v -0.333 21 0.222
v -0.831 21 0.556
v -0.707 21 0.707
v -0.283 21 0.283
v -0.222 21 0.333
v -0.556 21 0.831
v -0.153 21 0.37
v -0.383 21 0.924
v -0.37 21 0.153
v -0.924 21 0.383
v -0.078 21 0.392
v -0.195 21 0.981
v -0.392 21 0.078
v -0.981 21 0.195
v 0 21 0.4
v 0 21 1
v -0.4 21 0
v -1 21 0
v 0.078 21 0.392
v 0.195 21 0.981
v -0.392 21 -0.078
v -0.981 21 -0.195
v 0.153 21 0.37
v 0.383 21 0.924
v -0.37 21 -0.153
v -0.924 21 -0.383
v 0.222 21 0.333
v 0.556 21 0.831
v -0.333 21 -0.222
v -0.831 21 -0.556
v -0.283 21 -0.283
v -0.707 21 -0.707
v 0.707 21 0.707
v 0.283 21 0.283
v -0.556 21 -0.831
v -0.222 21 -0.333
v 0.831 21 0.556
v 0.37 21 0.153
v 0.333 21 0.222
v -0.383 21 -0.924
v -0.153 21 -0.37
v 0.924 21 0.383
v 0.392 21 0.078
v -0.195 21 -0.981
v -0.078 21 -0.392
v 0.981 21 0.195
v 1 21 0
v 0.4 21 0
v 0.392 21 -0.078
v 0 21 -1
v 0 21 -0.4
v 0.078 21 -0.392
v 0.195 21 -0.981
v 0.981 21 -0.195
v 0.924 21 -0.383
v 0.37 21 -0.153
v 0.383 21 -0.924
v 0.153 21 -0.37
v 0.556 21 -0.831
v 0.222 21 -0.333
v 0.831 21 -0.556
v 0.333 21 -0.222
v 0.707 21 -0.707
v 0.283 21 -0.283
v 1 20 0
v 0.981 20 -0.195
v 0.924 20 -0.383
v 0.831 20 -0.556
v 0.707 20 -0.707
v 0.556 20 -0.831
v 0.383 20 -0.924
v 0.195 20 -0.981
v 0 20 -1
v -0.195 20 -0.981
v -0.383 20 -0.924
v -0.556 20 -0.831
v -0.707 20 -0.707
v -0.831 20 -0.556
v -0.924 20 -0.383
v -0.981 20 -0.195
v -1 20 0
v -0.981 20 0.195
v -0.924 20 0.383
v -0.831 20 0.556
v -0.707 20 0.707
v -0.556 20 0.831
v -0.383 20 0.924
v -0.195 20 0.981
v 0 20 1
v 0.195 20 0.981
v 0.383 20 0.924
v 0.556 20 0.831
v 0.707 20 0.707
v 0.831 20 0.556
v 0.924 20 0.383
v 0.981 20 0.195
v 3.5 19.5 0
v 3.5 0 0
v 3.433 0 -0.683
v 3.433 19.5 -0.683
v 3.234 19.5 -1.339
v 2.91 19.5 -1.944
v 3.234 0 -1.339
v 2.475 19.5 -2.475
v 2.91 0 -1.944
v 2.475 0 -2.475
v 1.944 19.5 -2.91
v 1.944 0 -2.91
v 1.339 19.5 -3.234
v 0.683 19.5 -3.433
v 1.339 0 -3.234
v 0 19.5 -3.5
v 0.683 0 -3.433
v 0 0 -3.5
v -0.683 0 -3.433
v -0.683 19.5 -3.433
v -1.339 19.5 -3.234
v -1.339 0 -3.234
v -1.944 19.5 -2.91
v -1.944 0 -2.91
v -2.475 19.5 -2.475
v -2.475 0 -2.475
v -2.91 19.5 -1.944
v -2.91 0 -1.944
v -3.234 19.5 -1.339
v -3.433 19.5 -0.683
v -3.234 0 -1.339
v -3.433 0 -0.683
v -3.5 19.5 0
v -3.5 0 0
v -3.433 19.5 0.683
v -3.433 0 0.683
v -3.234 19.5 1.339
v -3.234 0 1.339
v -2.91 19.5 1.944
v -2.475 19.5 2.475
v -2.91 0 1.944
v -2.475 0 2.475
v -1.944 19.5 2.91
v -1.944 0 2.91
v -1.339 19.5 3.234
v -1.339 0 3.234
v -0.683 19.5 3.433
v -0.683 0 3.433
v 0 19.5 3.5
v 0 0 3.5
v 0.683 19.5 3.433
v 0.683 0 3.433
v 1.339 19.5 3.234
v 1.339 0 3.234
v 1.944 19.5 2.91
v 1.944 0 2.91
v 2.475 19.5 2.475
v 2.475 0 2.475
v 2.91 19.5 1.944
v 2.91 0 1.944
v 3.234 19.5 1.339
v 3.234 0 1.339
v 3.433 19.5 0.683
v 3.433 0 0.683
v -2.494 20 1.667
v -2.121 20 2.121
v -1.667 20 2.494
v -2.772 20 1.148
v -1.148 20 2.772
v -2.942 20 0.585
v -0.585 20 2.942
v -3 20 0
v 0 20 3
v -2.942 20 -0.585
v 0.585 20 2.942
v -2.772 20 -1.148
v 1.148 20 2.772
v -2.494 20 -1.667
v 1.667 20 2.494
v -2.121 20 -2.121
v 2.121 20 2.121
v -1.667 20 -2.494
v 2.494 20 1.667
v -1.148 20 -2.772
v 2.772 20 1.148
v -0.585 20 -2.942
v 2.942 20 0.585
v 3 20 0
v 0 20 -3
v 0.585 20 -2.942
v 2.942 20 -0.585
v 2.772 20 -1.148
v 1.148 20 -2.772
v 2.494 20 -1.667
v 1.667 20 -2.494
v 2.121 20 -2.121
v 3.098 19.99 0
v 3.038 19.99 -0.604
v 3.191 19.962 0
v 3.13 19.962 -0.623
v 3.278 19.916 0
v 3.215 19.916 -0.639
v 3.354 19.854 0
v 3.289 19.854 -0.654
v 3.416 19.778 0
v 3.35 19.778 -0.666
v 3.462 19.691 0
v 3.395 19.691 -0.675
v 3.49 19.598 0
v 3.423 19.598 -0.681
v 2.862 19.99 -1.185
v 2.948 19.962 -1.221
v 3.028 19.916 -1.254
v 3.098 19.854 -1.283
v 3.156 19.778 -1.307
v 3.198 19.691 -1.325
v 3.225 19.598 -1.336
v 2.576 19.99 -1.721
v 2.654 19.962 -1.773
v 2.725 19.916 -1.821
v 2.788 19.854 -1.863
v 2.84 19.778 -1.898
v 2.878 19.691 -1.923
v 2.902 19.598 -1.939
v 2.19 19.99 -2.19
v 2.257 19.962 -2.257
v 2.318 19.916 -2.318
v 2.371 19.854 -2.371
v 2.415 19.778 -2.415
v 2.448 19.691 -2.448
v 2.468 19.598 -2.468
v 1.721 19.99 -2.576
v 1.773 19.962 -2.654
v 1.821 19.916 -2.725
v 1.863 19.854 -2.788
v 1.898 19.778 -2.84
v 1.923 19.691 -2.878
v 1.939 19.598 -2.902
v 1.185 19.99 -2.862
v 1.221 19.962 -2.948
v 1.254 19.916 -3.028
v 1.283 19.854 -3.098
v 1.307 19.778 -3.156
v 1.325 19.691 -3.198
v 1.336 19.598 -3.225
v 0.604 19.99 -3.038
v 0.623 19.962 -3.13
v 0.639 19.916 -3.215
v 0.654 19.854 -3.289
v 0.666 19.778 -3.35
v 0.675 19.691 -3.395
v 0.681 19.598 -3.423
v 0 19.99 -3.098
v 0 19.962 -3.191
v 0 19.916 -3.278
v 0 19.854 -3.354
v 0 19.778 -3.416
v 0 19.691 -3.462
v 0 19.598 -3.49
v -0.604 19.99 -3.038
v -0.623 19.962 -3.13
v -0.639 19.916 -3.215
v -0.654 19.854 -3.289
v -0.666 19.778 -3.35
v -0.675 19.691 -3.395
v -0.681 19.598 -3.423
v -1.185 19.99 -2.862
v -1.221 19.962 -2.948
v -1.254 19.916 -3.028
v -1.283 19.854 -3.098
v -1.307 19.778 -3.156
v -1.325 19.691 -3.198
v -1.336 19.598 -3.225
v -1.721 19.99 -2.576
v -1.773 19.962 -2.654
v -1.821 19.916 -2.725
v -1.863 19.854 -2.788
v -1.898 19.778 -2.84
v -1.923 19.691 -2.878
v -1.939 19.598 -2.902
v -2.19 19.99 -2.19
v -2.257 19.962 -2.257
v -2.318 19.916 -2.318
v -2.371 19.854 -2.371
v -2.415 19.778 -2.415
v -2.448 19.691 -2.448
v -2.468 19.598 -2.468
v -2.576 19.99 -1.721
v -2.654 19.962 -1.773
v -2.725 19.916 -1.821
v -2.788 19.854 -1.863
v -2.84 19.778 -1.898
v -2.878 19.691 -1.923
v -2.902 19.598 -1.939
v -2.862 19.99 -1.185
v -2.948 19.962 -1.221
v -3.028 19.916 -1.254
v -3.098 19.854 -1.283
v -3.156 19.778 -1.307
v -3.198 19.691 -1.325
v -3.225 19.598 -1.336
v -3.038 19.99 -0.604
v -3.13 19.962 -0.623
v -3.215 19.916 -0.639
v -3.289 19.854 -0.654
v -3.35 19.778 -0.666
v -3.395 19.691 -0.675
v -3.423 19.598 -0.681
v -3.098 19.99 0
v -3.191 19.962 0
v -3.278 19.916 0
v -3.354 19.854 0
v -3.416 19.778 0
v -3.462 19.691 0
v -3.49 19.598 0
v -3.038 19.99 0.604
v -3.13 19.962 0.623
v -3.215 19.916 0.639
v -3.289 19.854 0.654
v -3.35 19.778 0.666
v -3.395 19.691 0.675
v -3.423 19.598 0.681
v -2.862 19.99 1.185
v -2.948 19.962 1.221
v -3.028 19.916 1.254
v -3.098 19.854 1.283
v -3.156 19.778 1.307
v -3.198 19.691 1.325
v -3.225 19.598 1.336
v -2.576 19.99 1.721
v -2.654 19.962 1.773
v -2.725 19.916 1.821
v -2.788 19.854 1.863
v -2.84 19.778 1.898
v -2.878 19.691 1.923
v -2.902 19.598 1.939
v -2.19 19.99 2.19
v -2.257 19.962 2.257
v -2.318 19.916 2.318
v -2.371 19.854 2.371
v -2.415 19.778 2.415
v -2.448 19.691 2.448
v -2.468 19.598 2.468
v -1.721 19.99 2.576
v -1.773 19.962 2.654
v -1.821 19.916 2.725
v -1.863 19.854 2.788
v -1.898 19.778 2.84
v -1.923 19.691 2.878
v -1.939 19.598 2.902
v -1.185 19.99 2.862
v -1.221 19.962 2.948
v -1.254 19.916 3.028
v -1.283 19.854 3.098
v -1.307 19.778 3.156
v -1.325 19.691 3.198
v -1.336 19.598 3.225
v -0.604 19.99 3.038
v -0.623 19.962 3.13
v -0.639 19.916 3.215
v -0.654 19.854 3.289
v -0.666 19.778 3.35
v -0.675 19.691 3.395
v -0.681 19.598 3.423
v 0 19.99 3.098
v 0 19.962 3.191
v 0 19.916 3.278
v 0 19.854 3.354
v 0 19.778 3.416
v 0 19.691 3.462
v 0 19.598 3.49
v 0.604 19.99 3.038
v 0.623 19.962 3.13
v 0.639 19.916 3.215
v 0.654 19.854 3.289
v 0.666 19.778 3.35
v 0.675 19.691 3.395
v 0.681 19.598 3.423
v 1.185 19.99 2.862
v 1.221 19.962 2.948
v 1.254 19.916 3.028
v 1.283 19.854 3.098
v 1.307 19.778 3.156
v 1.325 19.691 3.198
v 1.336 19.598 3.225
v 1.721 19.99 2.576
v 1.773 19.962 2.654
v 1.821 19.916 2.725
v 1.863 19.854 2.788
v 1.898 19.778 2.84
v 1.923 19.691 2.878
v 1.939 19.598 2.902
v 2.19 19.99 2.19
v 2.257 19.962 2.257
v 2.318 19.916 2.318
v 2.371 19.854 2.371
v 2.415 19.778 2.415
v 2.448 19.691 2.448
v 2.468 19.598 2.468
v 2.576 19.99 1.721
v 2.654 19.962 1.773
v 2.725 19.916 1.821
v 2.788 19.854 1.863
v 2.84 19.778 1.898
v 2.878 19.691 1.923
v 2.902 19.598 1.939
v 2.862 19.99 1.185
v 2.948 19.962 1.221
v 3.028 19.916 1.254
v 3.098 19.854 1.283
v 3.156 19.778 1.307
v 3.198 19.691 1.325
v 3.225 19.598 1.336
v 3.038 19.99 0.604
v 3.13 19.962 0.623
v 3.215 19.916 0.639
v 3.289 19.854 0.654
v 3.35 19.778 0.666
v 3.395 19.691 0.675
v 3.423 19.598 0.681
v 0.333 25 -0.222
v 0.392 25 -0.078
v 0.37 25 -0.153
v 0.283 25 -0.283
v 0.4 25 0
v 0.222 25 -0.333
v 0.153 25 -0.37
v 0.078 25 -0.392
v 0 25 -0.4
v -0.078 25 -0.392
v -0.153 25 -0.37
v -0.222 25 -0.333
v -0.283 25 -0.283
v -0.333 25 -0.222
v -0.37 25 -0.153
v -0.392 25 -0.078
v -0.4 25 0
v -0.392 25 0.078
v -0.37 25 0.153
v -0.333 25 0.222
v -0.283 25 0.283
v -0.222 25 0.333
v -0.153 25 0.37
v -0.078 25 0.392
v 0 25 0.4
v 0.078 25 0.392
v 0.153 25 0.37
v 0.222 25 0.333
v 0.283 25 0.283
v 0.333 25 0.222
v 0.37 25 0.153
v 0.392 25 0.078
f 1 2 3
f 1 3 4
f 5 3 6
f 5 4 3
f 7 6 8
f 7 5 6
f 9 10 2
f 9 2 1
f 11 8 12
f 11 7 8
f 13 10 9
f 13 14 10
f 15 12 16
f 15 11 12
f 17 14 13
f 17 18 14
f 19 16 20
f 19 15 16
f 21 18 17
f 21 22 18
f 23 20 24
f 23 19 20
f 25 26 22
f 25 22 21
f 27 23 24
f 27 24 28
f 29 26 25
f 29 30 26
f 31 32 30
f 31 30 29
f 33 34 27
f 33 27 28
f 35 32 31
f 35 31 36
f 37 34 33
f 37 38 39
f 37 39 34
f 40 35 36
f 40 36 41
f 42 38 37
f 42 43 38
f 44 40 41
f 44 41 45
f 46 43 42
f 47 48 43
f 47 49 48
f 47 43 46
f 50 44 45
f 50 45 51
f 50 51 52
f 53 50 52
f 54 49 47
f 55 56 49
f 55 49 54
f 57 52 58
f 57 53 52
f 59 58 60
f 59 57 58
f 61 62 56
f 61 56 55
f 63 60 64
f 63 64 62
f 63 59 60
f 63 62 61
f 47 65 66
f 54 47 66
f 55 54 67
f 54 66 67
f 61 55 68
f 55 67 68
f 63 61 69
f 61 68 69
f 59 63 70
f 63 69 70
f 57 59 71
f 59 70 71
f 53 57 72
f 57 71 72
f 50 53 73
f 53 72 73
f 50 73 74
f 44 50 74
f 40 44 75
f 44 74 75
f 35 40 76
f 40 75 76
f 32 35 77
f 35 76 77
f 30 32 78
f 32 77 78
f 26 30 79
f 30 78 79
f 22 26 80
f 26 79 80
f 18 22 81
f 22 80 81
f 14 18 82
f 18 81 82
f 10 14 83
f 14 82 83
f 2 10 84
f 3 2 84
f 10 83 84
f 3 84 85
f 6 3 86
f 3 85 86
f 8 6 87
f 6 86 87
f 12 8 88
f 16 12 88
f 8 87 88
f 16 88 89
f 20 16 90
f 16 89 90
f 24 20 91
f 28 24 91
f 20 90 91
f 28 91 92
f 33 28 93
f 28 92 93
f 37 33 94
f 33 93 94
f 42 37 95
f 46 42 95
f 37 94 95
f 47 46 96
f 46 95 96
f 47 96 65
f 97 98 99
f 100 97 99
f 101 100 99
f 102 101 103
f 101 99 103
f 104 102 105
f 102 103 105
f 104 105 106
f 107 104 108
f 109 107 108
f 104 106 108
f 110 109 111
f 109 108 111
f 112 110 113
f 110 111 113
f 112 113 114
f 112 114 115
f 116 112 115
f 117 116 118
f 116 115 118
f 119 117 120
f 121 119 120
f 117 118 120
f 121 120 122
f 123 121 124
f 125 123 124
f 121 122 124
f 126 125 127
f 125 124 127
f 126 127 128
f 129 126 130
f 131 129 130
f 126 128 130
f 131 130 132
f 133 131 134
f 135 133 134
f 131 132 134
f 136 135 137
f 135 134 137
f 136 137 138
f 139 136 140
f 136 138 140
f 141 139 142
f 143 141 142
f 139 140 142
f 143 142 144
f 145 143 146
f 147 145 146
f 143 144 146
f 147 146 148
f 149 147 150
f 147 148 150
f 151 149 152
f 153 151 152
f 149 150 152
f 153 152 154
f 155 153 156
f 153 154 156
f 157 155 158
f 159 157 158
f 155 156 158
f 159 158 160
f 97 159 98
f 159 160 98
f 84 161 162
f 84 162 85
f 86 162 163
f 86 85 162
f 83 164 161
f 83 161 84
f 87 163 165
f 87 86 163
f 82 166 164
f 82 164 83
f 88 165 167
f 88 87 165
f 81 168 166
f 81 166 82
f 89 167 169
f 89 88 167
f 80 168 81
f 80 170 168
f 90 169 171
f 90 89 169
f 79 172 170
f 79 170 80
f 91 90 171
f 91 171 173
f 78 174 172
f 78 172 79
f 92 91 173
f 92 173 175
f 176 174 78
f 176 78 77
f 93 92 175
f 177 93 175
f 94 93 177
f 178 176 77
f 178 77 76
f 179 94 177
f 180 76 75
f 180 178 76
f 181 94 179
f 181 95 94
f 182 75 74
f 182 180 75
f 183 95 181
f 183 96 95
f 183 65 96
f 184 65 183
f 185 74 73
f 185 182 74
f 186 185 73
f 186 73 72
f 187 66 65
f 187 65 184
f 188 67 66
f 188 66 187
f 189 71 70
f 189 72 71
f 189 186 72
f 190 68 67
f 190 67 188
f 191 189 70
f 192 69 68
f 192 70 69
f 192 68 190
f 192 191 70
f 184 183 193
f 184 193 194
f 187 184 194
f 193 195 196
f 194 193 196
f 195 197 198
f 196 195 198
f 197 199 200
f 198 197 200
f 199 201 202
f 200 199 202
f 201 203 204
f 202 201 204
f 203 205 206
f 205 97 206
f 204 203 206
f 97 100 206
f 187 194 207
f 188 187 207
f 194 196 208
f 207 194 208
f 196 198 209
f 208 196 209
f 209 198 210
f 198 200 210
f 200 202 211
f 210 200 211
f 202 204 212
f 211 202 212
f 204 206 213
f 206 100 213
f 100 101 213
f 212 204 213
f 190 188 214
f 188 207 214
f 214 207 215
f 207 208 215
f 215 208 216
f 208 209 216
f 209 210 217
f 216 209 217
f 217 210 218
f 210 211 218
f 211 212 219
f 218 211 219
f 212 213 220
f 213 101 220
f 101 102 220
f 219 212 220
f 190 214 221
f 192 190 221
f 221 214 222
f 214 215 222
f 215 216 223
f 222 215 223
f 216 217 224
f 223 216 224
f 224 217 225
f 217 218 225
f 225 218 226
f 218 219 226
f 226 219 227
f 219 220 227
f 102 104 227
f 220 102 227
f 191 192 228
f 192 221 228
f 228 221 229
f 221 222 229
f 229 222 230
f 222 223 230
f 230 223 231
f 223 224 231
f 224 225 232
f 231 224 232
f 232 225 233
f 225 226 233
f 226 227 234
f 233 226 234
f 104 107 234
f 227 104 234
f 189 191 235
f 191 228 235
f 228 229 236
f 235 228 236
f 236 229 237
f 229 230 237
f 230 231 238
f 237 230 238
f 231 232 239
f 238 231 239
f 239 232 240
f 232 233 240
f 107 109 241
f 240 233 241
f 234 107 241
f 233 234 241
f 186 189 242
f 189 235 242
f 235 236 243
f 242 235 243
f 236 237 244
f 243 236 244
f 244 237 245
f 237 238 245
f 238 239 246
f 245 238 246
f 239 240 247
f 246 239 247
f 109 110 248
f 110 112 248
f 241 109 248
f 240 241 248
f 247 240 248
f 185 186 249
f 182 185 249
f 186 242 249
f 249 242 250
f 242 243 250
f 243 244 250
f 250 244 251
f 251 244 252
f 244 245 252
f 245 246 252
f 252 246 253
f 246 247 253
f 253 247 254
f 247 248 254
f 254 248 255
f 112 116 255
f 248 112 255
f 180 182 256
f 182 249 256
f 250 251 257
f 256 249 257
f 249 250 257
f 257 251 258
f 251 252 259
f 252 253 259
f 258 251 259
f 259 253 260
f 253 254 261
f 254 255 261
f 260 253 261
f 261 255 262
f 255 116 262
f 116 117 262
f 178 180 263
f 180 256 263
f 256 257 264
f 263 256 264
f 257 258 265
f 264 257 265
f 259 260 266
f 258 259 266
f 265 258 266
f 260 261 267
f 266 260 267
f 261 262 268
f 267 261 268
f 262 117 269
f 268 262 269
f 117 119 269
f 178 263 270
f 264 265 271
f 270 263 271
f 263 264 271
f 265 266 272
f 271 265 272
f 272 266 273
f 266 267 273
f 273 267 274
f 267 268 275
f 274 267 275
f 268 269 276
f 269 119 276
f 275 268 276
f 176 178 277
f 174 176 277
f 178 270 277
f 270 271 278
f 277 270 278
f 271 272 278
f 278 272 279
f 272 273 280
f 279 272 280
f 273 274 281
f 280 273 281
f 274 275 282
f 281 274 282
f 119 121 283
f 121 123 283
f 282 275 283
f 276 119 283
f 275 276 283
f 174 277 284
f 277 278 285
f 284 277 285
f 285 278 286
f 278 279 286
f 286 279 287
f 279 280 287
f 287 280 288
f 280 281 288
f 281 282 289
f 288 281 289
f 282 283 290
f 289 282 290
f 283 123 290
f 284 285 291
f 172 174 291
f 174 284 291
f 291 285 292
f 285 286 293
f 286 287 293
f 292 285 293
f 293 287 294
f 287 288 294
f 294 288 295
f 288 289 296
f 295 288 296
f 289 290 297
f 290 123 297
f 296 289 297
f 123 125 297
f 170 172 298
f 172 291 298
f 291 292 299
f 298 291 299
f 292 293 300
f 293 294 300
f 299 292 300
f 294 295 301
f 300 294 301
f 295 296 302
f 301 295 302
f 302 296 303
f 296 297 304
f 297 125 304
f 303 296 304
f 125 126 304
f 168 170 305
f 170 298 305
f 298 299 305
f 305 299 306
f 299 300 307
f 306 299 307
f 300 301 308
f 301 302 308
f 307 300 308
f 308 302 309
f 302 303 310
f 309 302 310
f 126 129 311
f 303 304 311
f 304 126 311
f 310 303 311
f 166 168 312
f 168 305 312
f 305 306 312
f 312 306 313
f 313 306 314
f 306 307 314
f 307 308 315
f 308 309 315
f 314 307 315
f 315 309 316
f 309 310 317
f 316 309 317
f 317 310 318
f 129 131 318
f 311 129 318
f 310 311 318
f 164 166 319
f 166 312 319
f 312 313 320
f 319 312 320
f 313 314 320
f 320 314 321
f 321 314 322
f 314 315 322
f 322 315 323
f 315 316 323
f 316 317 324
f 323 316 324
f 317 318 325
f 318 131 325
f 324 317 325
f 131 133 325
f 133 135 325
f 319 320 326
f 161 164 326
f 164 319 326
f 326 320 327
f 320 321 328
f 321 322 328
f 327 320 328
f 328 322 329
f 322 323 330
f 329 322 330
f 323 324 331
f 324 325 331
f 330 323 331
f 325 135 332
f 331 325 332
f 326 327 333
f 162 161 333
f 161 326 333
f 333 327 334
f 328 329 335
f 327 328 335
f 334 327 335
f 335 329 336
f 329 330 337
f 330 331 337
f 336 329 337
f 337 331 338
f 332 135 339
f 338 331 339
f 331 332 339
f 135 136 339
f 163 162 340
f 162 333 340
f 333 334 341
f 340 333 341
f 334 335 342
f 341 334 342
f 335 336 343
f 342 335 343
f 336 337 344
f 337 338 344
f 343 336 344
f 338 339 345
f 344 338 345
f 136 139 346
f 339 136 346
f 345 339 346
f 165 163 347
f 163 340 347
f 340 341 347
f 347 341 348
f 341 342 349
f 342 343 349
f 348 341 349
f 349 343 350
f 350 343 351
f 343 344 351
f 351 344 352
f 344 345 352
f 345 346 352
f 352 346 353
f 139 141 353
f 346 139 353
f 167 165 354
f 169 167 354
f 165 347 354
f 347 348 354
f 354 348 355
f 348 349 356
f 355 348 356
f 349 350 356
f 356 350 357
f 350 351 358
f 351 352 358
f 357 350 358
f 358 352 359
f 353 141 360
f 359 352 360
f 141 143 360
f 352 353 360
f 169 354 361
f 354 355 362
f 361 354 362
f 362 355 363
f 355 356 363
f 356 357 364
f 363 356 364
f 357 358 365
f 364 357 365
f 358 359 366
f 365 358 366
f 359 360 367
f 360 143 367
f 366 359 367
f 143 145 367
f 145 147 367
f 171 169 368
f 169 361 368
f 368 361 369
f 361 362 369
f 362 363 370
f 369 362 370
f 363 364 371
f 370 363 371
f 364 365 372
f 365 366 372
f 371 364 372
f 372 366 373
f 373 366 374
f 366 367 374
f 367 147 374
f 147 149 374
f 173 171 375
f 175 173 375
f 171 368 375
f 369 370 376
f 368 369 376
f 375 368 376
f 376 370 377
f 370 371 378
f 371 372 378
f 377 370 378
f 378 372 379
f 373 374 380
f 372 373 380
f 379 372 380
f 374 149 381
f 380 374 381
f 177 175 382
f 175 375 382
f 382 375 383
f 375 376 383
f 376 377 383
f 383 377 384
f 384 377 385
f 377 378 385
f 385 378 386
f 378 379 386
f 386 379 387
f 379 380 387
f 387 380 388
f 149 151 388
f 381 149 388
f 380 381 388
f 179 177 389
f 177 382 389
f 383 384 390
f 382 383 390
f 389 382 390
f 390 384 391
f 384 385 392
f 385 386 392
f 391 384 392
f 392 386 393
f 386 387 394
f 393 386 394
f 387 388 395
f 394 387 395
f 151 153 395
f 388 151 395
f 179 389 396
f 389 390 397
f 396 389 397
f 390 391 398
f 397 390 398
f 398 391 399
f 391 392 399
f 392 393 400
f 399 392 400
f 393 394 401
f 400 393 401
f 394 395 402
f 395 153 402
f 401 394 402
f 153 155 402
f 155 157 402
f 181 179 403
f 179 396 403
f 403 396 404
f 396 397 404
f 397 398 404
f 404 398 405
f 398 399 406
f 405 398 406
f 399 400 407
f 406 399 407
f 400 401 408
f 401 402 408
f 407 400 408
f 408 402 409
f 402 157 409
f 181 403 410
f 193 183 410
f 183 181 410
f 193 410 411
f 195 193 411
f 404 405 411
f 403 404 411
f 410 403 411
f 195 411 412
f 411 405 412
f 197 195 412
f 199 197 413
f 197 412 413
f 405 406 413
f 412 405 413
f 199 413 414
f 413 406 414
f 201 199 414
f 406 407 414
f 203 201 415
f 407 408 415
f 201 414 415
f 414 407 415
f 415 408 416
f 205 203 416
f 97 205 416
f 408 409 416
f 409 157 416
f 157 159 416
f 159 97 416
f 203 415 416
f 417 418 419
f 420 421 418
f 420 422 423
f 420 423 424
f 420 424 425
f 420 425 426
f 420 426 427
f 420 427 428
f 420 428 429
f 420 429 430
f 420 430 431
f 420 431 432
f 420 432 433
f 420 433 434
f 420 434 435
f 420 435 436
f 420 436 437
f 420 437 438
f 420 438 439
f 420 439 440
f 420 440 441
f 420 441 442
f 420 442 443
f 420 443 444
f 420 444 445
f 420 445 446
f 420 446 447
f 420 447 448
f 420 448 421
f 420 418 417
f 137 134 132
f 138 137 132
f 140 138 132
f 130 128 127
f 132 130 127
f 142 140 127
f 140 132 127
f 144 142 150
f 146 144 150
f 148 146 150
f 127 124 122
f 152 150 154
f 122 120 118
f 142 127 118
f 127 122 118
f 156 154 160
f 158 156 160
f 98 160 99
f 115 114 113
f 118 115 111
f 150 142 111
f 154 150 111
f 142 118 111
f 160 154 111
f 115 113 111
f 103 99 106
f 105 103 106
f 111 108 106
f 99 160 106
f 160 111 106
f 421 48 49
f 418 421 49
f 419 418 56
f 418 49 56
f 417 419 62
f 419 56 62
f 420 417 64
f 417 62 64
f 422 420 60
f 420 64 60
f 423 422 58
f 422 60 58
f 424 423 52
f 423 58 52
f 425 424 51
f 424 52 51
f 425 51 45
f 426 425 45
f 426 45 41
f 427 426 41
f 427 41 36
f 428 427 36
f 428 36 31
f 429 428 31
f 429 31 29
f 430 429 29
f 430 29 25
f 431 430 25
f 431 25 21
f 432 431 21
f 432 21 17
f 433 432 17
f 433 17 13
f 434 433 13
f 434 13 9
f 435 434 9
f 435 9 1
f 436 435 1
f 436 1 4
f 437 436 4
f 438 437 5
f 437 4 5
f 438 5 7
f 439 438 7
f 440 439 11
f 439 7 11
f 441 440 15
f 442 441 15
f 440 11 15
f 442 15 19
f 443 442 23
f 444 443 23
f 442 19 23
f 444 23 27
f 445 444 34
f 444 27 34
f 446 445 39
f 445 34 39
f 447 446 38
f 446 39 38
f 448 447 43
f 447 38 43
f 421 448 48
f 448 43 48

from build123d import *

# Parameters (mm, degrees)
SKETCH1_R           = 3.5
BOSS_EXTRUDE1_DEPTH = 20
SKETCH2_R           = 1
BOSS_EXTRUDE2_DEPTH = 1
SKETCH3_R           = 0.4
BOSS_EXTRUDE3_DEPTH = 5
FILLET1_R           = 0.5


with BuildPart() as part:
    # Sketch1 → Boss-Extrude1 (new body)
    with BuildSketch(Plane(origin=(0, 0, 0), x_dir=(1, 0, 0), z_dir=(0, 1, 0))):
        Circle(SKETCH1_R)
    extrude(amount=BOSS_EXTRUDE1_DEPTH)

    # Sketch2 → Boss-Extrude2 (add)
    with BuildSketch(Plane(origin=(0, 20, 0), x_dir=(1, 0, 0), z_dir=(0, 1, 0))):
        Circle(SKETCH2_R)
    extrude(amount=BOSS_EXTRUDE2_DEPTH)

    # Sketch3 → Boss-Extrude3 (add)
    with BuildSketch(Plane(origin=(0, 20, 0), x_dir=(1, 0, 0), z_dir=(0, 1, 0))):
        Circle(SKETCH3_R)
    extrude(amount=BOSS_EXTRUDE3_DEPTH)

    # Fillet1
    fillet1_edges = [part.edges().sort_by_distance(p)[0] for p in [
        (-3.5, 20, 0),
    ]]
    fillet(fillet1_edges, radius=FILLET1_R)


solid = part.part
